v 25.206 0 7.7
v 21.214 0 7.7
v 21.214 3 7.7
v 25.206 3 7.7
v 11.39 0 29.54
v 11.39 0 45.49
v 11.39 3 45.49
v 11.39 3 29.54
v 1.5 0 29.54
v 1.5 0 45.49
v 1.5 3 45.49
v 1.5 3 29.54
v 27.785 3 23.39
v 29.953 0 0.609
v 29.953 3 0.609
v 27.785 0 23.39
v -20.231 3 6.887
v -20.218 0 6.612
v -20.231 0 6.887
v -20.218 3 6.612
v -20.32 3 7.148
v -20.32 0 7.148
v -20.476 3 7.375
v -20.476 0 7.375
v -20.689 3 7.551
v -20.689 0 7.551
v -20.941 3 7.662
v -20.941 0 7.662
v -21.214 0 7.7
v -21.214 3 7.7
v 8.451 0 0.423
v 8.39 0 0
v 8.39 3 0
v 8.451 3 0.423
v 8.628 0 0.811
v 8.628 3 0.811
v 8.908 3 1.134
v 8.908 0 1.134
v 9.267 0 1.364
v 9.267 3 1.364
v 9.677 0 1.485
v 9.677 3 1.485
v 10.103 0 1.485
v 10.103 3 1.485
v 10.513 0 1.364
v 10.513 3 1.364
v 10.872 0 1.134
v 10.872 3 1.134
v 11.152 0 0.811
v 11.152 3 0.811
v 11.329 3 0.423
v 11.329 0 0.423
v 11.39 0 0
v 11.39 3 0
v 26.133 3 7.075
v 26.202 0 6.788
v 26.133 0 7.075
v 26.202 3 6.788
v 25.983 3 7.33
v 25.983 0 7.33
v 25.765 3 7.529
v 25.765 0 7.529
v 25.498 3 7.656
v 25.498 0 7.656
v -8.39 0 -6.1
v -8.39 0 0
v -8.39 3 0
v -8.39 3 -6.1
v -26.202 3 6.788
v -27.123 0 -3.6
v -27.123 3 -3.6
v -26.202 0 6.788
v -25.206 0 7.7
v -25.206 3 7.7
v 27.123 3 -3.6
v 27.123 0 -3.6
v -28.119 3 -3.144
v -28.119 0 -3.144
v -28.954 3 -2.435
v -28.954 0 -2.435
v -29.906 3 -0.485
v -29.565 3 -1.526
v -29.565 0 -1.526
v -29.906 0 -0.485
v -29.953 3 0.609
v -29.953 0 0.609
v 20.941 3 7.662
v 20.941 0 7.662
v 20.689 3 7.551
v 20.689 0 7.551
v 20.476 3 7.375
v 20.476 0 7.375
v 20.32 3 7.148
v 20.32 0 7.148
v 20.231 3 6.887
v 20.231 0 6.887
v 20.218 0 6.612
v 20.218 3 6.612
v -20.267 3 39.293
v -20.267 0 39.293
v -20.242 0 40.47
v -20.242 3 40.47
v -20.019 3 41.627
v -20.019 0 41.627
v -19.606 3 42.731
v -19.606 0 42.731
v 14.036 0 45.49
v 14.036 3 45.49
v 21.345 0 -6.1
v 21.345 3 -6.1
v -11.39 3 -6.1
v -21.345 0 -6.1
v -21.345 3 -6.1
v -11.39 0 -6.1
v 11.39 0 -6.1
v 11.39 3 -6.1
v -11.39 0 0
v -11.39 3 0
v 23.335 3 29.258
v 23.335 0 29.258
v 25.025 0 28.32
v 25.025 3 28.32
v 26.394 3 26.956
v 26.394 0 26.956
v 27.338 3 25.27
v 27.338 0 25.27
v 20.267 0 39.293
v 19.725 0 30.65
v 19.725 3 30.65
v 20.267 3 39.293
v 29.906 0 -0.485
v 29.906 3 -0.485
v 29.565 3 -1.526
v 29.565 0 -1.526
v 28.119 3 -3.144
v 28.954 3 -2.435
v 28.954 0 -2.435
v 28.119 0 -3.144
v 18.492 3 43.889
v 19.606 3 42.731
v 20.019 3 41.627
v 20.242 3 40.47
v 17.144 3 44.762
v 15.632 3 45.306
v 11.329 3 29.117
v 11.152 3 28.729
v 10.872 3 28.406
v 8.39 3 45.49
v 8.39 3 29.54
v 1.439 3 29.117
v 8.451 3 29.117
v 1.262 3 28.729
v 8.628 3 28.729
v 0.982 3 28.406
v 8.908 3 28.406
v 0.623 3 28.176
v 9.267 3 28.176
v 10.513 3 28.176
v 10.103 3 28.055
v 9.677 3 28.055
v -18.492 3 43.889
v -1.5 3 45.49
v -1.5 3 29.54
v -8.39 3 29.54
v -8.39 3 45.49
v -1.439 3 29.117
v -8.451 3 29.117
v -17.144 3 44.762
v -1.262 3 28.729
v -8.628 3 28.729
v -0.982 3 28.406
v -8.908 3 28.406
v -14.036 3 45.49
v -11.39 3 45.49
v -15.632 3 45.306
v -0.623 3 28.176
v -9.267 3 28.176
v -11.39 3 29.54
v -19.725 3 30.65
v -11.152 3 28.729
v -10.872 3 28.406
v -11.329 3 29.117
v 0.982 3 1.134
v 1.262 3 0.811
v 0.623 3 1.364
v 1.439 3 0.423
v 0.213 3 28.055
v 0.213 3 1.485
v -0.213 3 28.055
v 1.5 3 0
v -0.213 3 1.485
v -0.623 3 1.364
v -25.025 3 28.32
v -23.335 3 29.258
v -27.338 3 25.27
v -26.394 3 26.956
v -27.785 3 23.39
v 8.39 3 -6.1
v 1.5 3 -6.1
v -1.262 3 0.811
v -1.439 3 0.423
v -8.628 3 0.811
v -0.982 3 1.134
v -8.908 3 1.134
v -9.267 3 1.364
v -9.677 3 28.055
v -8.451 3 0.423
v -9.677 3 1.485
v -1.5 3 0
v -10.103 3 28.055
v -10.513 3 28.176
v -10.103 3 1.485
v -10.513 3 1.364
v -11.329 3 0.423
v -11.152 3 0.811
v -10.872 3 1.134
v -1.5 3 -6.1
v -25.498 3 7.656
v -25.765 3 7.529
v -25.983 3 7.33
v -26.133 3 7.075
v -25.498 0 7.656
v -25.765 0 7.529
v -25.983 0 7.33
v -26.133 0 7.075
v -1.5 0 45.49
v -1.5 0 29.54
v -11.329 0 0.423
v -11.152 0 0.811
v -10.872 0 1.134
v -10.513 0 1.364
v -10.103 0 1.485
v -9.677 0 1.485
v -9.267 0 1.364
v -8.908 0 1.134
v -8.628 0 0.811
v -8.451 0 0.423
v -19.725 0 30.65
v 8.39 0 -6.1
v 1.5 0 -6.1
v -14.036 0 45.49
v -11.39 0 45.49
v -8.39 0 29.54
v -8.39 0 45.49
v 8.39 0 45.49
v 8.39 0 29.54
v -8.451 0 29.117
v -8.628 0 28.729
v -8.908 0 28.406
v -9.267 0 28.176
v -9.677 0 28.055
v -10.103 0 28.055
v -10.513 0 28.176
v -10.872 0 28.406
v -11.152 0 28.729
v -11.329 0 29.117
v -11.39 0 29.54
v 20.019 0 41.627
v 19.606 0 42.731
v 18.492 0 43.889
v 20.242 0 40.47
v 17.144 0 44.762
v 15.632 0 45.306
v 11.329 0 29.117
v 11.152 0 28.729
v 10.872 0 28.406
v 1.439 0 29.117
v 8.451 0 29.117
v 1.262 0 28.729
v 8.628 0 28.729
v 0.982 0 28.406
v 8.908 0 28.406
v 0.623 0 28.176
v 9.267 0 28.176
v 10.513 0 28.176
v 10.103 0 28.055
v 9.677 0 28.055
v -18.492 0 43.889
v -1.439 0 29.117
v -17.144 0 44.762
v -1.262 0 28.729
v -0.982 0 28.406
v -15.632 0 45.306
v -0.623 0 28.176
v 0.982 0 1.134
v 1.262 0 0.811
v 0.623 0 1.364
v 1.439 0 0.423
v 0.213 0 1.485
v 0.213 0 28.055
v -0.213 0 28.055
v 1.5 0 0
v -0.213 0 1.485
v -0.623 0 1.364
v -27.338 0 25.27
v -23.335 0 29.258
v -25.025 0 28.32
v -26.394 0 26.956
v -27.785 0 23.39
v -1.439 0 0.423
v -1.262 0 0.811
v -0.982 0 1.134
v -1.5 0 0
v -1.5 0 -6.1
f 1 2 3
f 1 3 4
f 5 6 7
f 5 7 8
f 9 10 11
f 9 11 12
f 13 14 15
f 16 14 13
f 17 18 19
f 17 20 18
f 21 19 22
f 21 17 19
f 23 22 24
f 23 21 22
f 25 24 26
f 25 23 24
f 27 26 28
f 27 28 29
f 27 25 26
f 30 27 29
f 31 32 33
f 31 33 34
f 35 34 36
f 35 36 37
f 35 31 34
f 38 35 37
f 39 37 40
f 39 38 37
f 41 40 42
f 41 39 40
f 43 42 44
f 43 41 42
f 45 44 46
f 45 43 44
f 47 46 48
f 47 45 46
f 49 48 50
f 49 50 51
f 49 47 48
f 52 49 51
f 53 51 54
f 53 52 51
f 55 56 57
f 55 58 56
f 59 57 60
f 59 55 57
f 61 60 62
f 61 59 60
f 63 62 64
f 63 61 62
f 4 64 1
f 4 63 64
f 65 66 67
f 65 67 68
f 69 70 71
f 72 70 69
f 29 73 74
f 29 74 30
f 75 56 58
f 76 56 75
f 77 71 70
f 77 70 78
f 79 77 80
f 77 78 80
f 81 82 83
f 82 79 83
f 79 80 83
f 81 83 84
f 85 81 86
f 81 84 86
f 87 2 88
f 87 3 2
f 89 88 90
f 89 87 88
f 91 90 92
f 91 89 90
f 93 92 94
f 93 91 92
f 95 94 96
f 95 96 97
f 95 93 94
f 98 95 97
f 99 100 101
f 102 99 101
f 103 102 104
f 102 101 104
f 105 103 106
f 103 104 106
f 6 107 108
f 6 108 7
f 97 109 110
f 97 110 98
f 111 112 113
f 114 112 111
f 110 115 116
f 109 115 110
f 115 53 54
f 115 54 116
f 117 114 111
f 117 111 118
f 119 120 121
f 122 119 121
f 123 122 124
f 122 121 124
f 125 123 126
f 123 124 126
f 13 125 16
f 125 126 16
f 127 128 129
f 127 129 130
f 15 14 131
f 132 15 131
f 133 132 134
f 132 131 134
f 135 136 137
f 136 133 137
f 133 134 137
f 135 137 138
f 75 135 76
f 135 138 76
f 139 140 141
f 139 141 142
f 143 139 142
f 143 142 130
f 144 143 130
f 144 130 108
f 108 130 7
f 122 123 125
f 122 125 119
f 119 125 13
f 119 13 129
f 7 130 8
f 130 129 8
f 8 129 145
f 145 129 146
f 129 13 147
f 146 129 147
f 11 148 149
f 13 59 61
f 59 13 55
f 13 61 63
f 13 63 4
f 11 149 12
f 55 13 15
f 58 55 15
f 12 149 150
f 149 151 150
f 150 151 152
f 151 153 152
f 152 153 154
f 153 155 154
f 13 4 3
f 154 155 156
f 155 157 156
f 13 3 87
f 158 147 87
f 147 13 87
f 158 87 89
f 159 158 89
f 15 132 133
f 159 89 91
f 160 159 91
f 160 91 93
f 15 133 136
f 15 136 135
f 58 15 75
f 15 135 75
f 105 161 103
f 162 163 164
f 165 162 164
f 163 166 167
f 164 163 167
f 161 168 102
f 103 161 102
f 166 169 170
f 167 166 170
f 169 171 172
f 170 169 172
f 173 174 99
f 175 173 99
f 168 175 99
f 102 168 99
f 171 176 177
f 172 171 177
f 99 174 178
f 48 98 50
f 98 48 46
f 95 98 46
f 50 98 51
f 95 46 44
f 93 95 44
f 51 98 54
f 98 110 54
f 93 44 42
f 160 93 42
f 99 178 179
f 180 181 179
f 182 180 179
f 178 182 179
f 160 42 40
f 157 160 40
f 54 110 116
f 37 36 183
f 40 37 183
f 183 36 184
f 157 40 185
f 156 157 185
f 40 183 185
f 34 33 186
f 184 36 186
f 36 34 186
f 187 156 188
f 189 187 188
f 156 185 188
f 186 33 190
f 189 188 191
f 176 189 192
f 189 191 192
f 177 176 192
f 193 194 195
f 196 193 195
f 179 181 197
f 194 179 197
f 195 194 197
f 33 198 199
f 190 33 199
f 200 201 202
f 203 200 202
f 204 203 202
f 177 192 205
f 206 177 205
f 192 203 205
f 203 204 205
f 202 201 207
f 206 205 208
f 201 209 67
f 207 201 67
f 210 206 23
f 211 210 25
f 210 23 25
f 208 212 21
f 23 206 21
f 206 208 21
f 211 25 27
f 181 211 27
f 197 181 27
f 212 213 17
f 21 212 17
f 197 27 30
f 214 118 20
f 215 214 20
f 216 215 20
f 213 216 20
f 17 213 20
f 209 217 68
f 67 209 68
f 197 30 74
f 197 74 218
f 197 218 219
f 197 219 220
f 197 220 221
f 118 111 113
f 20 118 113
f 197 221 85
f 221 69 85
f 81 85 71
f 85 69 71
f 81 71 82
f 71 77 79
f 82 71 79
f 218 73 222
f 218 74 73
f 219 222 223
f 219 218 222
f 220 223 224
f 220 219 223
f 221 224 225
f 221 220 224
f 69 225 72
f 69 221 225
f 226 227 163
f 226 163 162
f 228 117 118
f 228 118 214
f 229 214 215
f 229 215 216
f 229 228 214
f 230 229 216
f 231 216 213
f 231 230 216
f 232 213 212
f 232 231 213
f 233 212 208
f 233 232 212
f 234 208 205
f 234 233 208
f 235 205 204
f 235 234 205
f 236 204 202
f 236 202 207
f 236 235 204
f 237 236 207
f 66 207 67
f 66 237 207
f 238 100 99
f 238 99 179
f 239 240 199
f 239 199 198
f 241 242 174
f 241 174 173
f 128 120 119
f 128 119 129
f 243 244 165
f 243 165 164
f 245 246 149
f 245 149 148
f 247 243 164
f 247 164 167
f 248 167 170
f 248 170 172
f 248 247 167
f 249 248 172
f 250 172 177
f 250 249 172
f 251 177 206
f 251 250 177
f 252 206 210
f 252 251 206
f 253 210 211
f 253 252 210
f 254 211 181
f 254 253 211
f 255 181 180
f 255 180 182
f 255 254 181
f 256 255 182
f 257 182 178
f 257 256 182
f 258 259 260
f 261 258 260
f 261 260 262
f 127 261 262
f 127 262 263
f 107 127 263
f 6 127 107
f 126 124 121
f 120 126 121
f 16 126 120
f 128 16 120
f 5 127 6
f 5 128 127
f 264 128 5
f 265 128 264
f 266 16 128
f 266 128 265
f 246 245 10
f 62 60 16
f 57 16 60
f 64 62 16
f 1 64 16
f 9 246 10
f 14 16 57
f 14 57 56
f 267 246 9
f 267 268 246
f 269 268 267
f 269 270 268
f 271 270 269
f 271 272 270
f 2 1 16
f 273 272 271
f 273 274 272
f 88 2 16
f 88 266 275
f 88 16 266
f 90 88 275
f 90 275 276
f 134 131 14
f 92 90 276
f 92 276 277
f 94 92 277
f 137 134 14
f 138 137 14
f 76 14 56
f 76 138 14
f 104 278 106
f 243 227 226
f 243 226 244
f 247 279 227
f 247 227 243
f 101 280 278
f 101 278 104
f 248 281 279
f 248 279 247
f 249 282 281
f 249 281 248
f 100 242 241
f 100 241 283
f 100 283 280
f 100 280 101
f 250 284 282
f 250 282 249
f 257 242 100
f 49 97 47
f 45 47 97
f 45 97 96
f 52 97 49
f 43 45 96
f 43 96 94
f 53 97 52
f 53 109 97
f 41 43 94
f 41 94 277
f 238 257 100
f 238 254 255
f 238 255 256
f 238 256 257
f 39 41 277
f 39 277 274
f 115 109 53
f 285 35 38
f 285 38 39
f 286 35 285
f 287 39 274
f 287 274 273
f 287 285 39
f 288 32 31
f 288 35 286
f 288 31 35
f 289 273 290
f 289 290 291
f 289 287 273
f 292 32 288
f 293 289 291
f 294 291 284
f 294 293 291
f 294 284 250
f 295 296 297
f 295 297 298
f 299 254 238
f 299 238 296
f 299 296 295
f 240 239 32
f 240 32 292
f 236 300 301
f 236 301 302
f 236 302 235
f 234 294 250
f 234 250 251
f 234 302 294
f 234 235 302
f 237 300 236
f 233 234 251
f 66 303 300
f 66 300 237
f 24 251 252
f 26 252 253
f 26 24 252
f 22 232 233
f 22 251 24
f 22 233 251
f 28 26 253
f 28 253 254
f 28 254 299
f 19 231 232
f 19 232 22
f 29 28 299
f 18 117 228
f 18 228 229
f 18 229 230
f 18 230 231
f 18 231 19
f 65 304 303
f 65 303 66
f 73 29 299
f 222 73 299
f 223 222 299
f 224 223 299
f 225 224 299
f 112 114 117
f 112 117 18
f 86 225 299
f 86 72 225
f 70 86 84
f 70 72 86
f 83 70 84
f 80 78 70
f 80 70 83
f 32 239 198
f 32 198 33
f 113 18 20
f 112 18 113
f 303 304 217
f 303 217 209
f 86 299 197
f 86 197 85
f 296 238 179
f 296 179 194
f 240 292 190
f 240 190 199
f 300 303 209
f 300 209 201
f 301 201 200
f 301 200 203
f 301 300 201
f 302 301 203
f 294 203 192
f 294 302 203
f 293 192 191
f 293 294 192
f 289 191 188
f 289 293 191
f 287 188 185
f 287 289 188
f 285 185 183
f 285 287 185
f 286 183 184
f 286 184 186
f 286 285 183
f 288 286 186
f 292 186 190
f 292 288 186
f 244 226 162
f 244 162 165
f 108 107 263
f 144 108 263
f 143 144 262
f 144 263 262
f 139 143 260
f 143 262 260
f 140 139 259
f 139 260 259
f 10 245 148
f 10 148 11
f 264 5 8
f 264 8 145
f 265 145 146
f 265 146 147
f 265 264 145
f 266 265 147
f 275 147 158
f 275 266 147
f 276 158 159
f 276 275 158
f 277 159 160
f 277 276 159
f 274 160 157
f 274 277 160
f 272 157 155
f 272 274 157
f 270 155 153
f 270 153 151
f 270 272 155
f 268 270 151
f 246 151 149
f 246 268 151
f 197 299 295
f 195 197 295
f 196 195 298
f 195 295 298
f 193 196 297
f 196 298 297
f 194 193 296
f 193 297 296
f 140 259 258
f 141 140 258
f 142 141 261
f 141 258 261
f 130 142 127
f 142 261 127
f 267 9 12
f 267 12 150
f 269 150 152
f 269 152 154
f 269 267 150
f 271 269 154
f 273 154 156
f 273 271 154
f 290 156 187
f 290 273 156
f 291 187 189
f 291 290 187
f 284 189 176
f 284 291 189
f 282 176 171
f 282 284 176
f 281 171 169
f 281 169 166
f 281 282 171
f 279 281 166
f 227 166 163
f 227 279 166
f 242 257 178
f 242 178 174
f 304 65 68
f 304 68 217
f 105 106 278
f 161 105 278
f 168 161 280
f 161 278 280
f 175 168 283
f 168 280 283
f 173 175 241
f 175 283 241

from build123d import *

# Parameters (mm, degrees)
BOSS_EXTRUDE1_DEPTH = 3
FILLET1_R           = 4
FILLET2_R           = 1
FILLET3_R           = 7


with BuildPart() as part:
    # Sketch1 → Boss-Extrude1 (new body)
    with BuildSketch(Plane(origin=(0, 0, 0), x_dir=(1, 0, 0), z_dir=(0, 1, 0))):
        with BuildLine():
            Line((-1.5, 6.1), (-1.5, 0))
            ThreePointArc((-1.5, 0), (0, -1.5), (1.5, 0))
            Line((1.5, 0), (1.5, 6.1))
            Line((1.5, 6.1), (8.39, 6.1))
            Line((8.39, 6.1), (8.39, 0))
            ThreePointArc((8.39, 0), (9.89, -1.5), (11.39, 0))
            Line((11.39, 0), (11.39, 6.1))
            Line((11.39, 6.1), (21.345, 6.1))
            Line((21.345, 6.1), (20.121226415, -7.7))
            Line((20.121226415, -7.7), (26.121226415, -7.7))
            Line((26.121226415, -7.7), (27.123301887, 3.6))
            Line((27.123301887, 3.6), (30.353301887, 3.6))
            Line((30.353301887, 3.6), (27.375, -27.7))
            Line((27.375, -27.7), (19.725, -30.65))
            Line((19.725, -30.65), (20.405, -41.49))
            Line((20.405, -41.49), (17.97, -45.49))
            Line((17.97, -45.49), (11.39, -45.49))
            Line((11.39, -45.49), (11.39, -29.54))
            ThreePointArc((11.39, -29.54), (9.89, -28.04), (8.39, -29.54))
            Line((8.39, -29.54), (8.39, -45.49))
            Line((8.39, -45.49), (1.5, -45.49))
            Line((1.5, -45.49), (1.5, -29.54))
            ThreePointArc((1.5, -29.54), (0, -28.04), (-1.5, -29.54))
            Line((-1.5, -29.54), (-1.5, -45.49))
            Line((-1.5, -45.49), (-8.39, -45.49))
            Line((-8.39, -45.49), (-8.39, -29.54))
            ThreePointArc((-8.39, -29.54), (-9.89, -28.04), (-11.39, -29.54))
            Line((-11.39, -29.54), (-11.39, -45.49))
            Line((-11.39, -45.49), (-17.97, -45.49))
            Line((-17.97, -45.49), (-20.405, -41.49))
            Line((-20.405, -41.49), (-19.725, -30.65))
            Line((-19.725, -30.65), (-27.375, -27.7))
            Line((-27.375, -27.7), (-30.353301887, 3.6))
            Line((-30.353301887, 3.6), (-27.123301887, 3.6))
            Line((-27.123301887, 3.6), (-26.121226415, -7.7))
            Line((-26.121226415, -7.7), (-20.121226415, -7.7))
            Line((-20.121226415, -7.7), (-21.345, 6.1))
            Line((-21.345, 6.1), (-11.39, 6.1))
            Line((-11.39, 6.1), (-11.39, 0))
            ThreePointArc((-11.39, 0), (-9.89, -1.5), (-8.39, 0))
            Line((-8.39, 0), (-8.39, 6.1))
            Line((-8.39, 6.1), (-1.5, 6.1))
        make_face()
    extrude(amount=BOSS_EXTRUDE1_DEPTH)

    # Fillet1
    # the kernel refuses this fillet: 4 mm, written as the material it takes off along each edge
    with BuildSketch(Plane(origin=(-30.353301887, -10.570685878, -3.6), x_dir=(0.09472555048973348, 0, 0.9955034254508706), z_dir=(0, 1, 0))) as fillet1_piece_1:
        with BuildLine():
            CenterArc((4.228274351, 4), FILLET1_R, 191.310800098, 78.689199902)
            Line((0.305963528, 3.215476064), (0.227517312, 3.199785585))
            ThreePointArc((0.227517312, 3.199785585), (0.07334149, 1.615316076), (-0.079640274, 0.007578044))
            Line((-0.079640274, 0.007578044), (0, -0.08))
            Line((0, -0.08), (4.228274351, -0.08))
            Line((4.228274351, -0.08), (4.228274351, 0))
        make_face()
    extrude(amount=24.141371757, mode=Mode.SUBTRACT)
    with BuildSketch(Plane(origin=(30.353301887, -10.570685878, -3.6), x_dir=(-1, 0, 0), z_dir=(0, 1, 0))) as fillet1_piece_2:
        with BuildLine():
            CenterArc((4.382539317, 3.830359399), FILLET1_R, 174.564476221, 78.689199902)
            Line((0.400525616, 4.2092616), (0.320885342, 4.216839645))
            Line((0.320885342, 4.216839645), (-0.079640274, 0.007578044))
            Line((-0.079640274, 0.007578044), (0, -0.08))
            ThreePointArc((0, -0.08), (1.615, -0.08), (3.206949214, -0.076607188))
            Line((3.206949214, -0.076607188), (3.23, 0))
        make_face()
    extrude(amount=24.141371757, mode=Mode.SUBTRACT)

    # Fillet2
    fillet2_edges = [part.edges().sort_by_distance(p)[0] for p in [
        (20.121226415, 1.5, 7.7),
        (26.121226415, 1.5, 7.7),
        (-26.121226415, 1.5, 7.7),
        (-20.121226415, 1.5, 7.7),
    ]]
    fillet(fillet2_edges, radius=FILLET2_R)

    # Fillet3
    # the kernel refuses this fillet: 7 mm, written as the material it takes off along each edge
    with BuildSketch(Plane(origin=(-17.97, -9.834409558, 45.49), x_dir=(-0.5199808190603072, 0, -0.8541779368547118), z_dir=(0, 1, 0)), Plane(origin=(17.97, -9.834409558, 45.49), x_dir=(-1, 0, 0), z_dir=(0, 1, 0))) as fillet3_piece_1:
        with BuildLine():
            CenterArc((FILLET3_R * 0.561966260458, -FILLET3_R), FILLET3_R, 90, 58.669035113)
            Line((-FILLET3_R * 0.292211676397, -FILLET3_R * 0.48001918094), (0, 0))
            Line((0, 0), (FILLET3_R * 0.561966260458, 0))
        make_face()
    extrude(amount=22.668819116, mode=Mode.SUBTRACT)
    with BuildSketch(Plane(origin=(-20.405, -5.504377364, 41.49), x_dir=(0.0626075637538876, 0, -0.9980382221943221), z_dir=(0, 1, 0)), Plane(origin=(20.405, -5.504377364, 41.49), x_dir=(-0.5199808190603077, 0, 0.8541779368547114), z_dir=(0, 1, 0))) as fillet3_piece_2:
        with BuildLine():
            CenterArc((FILLET3_R * 0.314535849376, -FILLET3_R), FILLET3_R, 90, 34.920461628)
            Line((-FILLET3_R * 0.257902882493, -FILLET3_R * 0.180052502744), (0, 0))
            Line((0, 0), (FILLET3_R * 0.314535849376, 0))
        make_face()
    extrude(amount=14.008754728, mode=Mode.SUBTRACT)
    with BuildSketch(Plane(origin=(-27.375, -10.824428121, 27.7), x_dir=(-0.09472555048973366, 0, -0.9955034254508704), z_dir=(0, 1, 0)), Plane(origin=(27.375, -10.824428121, 27.7), x_dir=(-0.9330309060396333, 0, 0.3597962317407744), z_dir=(0, 1, 0))) as fillet3_piece_3:
        with BuildLine():
            CenterArc((FILLET3_R * 0.61853874979, -FILLET3_R), FILLET3_R, 90, 63.476793772)
            Line((-FILLET3_R * 0.276214817108, -FILLET3_R * 0.553439752639), (0, 0))
            Line((0, 0), (FILLET3_R * 0.61853874979, 0))
        make_face()
    extrude(amount=24.648856243, mode=Mode.SUBTRACT)


solid = part.part
